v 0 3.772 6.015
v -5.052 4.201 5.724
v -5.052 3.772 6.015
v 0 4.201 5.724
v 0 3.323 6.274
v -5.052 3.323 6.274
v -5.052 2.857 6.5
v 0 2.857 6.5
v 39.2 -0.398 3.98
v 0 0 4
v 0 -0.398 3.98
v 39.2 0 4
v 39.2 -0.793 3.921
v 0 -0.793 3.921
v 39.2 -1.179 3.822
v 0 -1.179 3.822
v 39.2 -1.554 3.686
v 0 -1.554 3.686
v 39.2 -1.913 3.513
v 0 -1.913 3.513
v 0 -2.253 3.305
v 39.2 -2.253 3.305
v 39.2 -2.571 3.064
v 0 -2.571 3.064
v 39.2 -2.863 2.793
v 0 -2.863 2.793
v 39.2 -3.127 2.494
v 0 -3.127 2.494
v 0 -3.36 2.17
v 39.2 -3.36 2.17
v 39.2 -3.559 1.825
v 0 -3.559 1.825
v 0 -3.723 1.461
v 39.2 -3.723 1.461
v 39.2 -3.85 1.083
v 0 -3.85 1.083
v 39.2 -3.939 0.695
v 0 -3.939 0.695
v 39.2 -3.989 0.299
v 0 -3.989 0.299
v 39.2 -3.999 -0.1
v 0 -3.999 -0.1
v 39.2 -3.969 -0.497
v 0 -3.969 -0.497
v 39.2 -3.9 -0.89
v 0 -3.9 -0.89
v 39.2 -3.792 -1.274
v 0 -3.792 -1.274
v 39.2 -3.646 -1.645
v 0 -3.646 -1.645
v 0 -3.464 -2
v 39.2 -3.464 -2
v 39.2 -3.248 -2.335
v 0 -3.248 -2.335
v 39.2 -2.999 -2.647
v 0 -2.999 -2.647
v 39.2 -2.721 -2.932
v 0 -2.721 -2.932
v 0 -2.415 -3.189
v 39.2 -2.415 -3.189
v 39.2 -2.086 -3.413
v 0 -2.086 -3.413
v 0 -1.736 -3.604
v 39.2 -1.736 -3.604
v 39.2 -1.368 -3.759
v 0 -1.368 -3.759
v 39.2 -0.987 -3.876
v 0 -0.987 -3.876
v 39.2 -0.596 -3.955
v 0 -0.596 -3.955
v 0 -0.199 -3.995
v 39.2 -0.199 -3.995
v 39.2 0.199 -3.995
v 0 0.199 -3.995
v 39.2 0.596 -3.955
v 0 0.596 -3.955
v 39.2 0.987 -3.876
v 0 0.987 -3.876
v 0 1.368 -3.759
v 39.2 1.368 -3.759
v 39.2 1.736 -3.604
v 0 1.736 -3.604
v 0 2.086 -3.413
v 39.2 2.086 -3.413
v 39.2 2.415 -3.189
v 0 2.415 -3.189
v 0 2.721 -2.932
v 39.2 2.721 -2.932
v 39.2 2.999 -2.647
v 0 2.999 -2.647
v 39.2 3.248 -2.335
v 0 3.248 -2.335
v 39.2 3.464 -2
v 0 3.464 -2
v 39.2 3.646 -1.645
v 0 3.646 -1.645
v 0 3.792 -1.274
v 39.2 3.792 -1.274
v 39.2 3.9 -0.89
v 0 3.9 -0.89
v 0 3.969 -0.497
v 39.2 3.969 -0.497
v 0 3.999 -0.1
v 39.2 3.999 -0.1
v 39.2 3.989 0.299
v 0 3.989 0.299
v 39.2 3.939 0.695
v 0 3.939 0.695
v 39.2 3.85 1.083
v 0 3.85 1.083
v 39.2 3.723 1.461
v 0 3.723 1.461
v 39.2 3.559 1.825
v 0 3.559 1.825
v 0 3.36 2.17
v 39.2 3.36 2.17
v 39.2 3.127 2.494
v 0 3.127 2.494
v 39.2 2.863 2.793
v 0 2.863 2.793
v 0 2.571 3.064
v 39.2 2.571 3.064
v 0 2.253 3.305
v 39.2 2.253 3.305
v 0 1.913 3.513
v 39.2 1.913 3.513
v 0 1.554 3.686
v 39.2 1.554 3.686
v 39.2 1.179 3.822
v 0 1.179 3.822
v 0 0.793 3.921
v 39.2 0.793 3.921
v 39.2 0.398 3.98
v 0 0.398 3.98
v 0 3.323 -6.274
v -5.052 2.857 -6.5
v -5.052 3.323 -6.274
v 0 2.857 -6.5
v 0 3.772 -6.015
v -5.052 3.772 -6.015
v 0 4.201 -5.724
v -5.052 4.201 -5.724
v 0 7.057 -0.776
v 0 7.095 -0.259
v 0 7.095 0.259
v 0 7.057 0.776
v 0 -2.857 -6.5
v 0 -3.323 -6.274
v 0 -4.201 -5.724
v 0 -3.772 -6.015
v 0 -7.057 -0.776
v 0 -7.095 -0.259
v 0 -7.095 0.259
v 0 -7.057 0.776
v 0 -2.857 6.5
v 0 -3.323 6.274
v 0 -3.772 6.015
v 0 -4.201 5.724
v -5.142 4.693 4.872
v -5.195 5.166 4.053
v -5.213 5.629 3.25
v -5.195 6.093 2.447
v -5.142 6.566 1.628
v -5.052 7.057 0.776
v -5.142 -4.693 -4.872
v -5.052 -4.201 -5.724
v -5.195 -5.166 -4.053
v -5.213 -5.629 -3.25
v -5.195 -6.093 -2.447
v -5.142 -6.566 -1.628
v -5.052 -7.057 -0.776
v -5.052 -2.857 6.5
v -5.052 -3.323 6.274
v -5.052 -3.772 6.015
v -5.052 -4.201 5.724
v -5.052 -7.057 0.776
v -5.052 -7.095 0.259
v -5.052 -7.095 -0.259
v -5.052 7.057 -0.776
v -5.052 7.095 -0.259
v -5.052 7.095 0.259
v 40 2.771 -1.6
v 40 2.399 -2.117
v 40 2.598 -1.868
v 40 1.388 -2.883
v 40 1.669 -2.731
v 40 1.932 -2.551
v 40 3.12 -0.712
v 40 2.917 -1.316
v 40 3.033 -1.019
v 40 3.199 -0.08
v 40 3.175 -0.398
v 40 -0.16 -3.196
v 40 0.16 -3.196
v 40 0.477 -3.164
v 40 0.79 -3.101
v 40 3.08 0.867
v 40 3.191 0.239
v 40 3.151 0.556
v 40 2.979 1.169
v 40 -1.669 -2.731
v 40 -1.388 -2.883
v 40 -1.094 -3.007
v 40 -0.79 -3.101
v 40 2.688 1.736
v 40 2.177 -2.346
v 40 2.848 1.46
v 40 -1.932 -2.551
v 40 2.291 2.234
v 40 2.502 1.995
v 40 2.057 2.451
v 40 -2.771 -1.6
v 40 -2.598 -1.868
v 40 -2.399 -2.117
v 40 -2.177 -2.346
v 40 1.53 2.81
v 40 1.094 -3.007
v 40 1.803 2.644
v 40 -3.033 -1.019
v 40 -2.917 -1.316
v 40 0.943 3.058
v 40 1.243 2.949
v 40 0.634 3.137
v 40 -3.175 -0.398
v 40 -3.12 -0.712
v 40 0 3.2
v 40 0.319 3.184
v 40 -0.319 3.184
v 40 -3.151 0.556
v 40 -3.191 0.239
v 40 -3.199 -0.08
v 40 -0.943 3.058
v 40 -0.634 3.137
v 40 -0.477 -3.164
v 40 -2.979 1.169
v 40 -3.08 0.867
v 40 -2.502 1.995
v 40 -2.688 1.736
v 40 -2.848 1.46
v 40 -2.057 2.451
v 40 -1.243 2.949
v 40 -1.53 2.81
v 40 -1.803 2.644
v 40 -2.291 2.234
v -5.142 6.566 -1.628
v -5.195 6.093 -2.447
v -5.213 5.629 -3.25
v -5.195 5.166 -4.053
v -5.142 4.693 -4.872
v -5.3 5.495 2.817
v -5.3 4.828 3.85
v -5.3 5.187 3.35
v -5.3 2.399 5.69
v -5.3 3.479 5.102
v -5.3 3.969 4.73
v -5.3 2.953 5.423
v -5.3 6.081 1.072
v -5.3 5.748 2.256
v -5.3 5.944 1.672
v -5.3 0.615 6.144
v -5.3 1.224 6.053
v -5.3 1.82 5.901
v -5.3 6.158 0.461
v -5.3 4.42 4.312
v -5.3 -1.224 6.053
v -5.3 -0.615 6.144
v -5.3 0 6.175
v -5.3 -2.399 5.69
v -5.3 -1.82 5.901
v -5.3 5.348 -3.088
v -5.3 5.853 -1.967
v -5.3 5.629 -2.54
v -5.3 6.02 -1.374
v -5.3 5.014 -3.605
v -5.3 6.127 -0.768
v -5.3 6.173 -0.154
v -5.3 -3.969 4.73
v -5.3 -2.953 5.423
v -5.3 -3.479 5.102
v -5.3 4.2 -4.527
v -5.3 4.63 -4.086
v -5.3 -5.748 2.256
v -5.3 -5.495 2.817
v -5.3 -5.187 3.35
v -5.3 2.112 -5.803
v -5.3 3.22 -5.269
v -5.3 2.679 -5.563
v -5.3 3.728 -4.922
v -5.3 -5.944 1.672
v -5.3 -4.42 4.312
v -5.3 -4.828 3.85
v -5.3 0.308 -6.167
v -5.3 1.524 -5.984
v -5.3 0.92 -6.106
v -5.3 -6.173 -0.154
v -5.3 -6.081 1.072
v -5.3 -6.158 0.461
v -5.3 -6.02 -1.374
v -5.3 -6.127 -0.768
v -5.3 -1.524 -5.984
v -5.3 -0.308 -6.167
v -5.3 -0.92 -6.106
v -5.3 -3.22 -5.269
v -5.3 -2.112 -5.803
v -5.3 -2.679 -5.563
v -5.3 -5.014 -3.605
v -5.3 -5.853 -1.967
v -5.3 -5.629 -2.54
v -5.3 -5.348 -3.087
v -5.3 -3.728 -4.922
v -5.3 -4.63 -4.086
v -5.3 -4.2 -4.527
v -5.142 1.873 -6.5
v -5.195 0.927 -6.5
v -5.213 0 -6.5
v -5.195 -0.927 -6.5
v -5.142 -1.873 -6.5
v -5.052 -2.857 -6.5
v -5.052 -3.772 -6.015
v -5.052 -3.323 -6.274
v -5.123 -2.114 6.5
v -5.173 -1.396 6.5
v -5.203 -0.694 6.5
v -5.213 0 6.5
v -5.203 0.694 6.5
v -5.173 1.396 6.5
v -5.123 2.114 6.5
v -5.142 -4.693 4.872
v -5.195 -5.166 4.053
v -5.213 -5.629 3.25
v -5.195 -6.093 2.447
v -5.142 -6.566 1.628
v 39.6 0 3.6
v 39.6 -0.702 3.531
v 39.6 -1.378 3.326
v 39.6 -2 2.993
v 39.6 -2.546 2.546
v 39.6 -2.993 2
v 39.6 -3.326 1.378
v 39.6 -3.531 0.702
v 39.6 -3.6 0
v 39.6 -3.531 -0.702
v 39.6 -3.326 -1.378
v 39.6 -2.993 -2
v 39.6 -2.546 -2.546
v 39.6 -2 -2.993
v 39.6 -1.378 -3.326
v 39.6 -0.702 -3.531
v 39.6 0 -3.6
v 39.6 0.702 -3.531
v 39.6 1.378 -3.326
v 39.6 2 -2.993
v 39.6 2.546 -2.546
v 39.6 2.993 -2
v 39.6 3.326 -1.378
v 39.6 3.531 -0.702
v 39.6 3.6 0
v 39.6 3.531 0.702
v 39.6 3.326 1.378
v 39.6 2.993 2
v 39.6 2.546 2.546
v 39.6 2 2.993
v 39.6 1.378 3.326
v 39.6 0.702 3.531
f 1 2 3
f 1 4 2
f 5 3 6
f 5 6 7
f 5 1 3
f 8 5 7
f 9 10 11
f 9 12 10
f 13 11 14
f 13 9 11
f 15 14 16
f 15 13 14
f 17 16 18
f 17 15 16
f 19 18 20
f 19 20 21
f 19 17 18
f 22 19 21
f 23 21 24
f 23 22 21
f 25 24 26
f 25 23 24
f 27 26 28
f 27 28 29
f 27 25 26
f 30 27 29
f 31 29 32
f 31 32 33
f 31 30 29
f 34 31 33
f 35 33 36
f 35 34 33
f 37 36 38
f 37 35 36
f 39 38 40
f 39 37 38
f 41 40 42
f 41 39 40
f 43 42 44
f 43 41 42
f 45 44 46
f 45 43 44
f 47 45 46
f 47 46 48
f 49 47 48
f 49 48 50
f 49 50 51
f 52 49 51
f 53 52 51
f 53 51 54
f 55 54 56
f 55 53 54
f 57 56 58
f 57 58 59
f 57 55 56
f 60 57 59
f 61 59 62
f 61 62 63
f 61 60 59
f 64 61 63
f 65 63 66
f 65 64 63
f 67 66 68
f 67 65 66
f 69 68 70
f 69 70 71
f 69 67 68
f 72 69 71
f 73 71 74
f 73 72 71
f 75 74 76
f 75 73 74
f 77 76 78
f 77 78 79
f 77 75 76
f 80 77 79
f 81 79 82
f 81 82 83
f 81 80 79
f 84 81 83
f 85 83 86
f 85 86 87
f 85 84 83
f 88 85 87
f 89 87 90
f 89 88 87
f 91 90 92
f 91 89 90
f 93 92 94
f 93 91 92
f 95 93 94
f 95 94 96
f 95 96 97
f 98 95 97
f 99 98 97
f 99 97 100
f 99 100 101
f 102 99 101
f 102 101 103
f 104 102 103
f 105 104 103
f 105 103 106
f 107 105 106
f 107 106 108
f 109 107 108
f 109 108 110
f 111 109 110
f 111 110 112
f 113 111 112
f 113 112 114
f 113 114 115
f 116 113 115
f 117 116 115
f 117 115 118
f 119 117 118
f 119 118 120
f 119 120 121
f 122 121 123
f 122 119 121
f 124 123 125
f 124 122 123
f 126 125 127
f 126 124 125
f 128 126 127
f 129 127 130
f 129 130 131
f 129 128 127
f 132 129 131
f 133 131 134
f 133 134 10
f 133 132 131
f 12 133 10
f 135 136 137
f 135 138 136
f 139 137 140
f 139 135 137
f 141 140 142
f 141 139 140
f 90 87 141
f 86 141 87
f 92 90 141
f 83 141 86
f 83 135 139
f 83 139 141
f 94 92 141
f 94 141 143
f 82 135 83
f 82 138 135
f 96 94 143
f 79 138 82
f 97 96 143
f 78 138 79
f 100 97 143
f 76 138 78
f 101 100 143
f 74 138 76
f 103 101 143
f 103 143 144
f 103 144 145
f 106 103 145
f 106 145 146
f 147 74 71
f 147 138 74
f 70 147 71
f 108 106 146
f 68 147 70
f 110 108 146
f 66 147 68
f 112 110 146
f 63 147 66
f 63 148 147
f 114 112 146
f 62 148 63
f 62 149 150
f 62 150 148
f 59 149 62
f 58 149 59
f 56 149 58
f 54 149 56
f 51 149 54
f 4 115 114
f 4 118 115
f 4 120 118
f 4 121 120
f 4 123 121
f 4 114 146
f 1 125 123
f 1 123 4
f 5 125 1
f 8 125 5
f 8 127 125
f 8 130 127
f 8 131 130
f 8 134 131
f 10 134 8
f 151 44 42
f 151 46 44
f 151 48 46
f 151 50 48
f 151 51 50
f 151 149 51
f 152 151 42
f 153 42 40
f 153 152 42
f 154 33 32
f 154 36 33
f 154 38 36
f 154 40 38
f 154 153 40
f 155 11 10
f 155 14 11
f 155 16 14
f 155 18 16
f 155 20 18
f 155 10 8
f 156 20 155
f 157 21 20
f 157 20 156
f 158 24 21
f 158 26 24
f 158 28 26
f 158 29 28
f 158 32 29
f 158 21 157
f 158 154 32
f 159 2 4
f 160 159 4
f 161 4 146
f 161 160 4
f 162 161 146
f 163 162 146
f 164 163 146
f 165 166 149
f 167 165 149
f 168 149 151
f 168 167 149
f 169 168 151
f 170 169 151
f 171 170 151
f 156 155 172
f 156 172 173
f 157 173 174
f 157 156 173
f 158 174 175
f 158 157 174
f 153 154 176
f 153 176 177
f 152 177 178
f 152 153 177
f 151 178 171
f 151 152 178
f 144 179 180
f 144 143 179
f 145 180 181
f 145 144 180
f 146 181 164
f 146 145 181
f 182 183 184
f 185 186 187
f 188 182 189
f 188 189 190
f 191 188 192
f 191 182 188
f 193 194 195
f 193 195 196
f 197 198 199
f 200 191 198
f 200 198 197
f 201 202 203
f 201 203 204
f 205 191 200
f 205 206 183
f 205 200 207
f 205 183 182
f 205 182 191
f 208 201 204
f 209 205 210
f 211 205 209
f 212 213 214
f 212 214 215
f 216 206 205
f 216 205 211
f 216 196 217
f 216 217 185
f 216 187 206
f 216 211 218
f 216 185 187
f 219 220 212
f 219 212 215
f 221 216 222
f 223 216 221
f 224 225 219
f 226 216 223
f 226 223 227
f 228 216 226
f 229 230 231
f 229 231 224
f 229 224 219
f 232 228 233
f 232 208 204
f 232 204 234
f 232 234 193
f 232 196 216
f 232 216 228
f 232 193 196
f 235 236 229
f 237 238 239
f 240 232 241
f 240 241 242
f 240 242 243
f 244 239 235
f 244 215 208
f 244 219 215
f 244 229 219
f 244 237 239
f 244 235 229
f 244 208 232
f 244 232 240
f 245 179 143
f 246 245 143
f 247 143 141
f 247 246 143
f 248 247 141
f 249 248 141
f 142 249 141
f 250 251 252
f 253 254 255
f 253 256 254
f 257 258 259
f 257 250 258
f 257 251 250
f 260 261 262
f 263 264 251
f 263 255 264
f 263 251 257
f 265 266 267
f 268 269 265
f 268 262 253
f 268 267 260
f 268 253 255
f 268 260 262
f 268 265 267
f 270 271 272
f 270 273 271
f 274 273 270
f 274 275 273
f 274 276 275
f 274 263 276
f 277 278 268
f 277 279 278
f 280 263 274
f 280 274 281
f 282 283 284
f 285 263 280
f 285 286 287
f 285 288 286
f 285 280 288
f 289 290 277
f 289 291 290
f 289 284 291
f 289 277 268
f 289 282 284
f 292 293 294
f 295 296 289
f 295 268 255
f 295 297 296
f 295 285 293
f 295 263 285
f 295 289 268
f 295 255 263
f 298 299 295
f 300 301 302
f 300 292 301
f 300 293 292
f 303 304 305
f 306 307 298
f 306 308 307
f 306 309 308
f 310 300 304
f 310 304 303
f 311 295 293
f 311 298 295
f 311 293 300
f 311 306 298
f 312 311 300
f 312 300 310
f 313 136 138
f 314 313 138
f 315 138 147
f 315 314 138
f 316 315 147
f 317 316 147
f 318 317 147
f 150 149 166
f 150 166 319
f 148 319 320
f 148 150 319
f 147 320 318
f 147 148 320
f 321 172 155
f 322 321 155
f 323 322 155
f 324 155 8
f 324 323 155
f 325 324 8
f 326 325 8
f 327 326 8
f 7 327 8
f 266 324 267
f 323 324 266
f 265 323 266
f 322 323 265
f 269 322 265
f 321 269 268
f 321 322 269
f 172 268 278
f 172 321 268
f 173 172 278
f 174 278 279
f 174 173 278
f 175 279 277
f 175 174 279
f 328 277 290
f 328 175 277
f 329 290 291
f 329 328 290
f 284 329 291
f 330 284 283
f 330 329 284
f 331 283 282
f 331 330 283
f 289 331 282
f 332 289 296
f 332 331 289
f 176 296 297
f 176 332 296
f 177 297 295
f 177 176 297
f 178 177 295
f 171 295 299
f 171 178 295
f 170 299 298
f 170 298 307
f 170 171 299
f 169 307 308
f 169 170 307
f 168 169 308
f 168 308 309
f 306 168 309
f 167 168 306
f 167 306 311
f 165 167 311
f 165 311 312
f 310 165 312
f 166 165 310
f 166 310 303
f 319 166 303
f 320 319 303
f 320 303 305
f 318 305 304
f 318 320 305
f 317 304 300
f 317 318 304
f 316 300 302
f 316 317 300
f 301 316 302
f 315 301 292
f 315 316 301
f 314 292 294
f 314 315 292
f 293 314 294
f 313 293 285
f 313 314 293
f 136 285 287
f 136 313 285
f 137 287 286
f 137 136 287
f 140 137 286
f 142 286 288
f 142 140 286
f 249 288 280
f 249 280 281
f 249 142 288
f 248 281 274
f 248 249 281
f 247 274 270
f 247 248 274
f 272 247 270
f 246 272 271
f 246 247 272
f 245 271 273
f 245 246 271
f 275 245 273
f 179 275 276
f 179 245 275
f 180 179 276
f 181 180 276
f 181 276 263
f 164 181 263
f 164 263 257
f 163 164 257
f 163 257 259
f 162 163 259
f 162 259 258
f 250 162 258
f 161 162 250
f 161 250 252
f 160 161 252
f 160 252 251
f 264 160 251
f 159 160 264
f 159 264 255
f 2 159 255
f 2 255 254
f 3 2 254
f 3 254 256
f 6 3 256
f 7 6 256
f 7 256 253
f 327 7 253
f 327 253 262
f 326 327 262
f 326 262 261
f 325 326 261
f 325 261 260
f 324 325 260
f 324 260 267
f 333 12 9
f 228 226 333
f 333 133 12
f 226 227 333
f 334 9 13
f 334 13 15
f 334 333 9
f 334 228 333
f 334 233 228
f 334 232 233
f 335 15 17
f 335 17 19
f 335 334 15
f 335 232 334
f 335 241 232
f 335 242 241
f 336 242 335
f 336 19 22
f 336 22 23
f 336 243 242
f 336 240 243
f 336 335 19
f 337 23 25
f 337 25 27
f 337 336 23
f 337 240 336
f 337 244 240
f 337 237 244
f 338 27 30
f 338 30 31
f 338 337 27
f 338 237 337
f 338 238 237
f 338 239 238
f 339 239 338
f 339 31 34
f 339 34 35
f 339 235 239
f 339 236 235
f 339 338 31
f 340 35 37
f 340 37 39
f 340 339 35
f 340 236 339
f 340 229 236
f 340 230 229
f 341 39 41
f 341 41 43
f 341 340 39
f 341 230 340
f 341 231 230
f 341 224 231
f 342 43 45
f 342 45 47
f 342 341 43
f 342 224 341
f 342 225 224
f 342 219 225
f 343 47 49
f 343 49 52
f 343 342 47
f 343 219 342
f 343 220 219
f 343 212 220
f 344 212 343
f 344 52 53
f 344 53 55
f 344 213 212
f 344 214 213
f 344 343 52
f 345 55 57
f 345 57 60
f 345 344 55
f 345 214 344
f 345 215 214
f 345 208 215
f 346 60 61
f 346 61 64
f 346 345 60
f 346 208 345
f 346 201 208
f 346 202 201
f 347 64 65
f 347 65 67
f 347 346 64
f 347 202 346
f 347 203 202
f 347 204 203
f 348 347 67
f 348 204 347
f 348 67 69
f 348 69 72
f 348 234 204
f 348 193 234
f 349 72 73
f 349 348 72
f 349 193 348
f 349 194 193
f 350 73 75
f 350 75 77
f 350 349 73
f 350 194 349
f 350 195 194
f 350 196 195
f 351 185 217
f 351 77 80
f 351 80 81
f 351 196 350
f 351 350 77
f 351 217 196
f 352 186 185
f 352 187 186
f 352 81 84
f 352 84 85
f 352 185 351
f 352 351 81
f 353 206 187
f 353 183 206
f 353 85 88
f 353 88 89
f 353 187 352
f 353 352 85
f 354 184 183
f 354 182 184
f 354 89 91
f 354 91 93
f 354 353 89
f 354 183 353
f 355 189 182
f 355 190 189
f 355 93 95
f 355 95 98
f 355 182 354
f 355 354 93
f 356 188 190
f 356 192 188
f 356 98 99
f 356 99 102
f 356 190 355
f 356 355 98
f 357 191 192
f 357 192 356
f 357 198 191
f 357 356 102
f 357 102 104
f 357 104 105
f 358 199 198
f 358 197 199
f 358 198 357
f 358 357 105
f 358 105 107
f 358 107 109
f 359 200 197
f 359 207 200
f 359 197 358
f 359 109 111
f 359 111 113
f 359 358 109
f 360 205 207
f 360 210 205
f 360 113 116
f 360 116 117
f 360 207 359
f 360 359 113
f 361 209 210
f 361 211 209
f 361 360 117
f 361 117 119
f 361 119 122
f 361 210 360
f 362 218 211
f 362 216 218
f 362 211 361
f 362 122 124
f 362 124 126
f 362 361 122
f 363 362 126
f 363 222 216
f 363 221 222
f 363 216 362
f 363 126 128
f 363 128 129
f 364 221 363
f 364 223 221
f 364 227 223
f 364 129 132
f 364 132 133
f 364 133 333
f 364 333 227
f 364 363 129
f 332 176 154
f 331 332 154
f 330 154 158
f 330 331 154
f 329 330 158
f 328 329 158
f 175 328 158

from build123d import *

# Parameters (mm, degrees)
SKETCH_2_OUTSIDE_W  = 26.11
SKETCH_2_OUTSIDE_H  = 26.11
CUT_EXTRUDE_1_DEPTH = 45.3


with BuildPart() as part:
    # Эскиз1 → Повернуть1 (revolve)
    with BuildSketch(Plane.XY, mode=Mode.PRIVATE) as revolve_1_sk:
        Polygon((-5.3, 0), (-5.3, 6.175), (-5.052146997, 7.1), (0, 7.1), (0, 4), (39.2, 4), (40, 3.2), (40, 0), align=None)
    revolve(revolve_1_sk.sketch.rotate(Axis((-1000, 0, 0), (1, 0, 0)), 90), axis=Axis((-1000, 0, 0), (1, 0, 0)))

    # Эскиз2 outside → Вырез-Вытянуть1 (cut)
    with BuildSketch(Plane.ZY.offset(5.3)):
        Rectangle(SKETCH_2_OUTSIDE_W, SKETCH_2_OUTSIDE_H)
        Polygon((0, 7.505553499), (-6.5, 3.75277675), (-6.5, -3.75277675), (0, -7.505553499), (6.5, -3.75277675), (6.5, 3.75277675), align=None, mode=Mode.SUBTRACT)
    extrude(amount=-CUT_EXTRUDE_1_DEPTH, mode=Mode.SUBTRACT)


solid = part.part
